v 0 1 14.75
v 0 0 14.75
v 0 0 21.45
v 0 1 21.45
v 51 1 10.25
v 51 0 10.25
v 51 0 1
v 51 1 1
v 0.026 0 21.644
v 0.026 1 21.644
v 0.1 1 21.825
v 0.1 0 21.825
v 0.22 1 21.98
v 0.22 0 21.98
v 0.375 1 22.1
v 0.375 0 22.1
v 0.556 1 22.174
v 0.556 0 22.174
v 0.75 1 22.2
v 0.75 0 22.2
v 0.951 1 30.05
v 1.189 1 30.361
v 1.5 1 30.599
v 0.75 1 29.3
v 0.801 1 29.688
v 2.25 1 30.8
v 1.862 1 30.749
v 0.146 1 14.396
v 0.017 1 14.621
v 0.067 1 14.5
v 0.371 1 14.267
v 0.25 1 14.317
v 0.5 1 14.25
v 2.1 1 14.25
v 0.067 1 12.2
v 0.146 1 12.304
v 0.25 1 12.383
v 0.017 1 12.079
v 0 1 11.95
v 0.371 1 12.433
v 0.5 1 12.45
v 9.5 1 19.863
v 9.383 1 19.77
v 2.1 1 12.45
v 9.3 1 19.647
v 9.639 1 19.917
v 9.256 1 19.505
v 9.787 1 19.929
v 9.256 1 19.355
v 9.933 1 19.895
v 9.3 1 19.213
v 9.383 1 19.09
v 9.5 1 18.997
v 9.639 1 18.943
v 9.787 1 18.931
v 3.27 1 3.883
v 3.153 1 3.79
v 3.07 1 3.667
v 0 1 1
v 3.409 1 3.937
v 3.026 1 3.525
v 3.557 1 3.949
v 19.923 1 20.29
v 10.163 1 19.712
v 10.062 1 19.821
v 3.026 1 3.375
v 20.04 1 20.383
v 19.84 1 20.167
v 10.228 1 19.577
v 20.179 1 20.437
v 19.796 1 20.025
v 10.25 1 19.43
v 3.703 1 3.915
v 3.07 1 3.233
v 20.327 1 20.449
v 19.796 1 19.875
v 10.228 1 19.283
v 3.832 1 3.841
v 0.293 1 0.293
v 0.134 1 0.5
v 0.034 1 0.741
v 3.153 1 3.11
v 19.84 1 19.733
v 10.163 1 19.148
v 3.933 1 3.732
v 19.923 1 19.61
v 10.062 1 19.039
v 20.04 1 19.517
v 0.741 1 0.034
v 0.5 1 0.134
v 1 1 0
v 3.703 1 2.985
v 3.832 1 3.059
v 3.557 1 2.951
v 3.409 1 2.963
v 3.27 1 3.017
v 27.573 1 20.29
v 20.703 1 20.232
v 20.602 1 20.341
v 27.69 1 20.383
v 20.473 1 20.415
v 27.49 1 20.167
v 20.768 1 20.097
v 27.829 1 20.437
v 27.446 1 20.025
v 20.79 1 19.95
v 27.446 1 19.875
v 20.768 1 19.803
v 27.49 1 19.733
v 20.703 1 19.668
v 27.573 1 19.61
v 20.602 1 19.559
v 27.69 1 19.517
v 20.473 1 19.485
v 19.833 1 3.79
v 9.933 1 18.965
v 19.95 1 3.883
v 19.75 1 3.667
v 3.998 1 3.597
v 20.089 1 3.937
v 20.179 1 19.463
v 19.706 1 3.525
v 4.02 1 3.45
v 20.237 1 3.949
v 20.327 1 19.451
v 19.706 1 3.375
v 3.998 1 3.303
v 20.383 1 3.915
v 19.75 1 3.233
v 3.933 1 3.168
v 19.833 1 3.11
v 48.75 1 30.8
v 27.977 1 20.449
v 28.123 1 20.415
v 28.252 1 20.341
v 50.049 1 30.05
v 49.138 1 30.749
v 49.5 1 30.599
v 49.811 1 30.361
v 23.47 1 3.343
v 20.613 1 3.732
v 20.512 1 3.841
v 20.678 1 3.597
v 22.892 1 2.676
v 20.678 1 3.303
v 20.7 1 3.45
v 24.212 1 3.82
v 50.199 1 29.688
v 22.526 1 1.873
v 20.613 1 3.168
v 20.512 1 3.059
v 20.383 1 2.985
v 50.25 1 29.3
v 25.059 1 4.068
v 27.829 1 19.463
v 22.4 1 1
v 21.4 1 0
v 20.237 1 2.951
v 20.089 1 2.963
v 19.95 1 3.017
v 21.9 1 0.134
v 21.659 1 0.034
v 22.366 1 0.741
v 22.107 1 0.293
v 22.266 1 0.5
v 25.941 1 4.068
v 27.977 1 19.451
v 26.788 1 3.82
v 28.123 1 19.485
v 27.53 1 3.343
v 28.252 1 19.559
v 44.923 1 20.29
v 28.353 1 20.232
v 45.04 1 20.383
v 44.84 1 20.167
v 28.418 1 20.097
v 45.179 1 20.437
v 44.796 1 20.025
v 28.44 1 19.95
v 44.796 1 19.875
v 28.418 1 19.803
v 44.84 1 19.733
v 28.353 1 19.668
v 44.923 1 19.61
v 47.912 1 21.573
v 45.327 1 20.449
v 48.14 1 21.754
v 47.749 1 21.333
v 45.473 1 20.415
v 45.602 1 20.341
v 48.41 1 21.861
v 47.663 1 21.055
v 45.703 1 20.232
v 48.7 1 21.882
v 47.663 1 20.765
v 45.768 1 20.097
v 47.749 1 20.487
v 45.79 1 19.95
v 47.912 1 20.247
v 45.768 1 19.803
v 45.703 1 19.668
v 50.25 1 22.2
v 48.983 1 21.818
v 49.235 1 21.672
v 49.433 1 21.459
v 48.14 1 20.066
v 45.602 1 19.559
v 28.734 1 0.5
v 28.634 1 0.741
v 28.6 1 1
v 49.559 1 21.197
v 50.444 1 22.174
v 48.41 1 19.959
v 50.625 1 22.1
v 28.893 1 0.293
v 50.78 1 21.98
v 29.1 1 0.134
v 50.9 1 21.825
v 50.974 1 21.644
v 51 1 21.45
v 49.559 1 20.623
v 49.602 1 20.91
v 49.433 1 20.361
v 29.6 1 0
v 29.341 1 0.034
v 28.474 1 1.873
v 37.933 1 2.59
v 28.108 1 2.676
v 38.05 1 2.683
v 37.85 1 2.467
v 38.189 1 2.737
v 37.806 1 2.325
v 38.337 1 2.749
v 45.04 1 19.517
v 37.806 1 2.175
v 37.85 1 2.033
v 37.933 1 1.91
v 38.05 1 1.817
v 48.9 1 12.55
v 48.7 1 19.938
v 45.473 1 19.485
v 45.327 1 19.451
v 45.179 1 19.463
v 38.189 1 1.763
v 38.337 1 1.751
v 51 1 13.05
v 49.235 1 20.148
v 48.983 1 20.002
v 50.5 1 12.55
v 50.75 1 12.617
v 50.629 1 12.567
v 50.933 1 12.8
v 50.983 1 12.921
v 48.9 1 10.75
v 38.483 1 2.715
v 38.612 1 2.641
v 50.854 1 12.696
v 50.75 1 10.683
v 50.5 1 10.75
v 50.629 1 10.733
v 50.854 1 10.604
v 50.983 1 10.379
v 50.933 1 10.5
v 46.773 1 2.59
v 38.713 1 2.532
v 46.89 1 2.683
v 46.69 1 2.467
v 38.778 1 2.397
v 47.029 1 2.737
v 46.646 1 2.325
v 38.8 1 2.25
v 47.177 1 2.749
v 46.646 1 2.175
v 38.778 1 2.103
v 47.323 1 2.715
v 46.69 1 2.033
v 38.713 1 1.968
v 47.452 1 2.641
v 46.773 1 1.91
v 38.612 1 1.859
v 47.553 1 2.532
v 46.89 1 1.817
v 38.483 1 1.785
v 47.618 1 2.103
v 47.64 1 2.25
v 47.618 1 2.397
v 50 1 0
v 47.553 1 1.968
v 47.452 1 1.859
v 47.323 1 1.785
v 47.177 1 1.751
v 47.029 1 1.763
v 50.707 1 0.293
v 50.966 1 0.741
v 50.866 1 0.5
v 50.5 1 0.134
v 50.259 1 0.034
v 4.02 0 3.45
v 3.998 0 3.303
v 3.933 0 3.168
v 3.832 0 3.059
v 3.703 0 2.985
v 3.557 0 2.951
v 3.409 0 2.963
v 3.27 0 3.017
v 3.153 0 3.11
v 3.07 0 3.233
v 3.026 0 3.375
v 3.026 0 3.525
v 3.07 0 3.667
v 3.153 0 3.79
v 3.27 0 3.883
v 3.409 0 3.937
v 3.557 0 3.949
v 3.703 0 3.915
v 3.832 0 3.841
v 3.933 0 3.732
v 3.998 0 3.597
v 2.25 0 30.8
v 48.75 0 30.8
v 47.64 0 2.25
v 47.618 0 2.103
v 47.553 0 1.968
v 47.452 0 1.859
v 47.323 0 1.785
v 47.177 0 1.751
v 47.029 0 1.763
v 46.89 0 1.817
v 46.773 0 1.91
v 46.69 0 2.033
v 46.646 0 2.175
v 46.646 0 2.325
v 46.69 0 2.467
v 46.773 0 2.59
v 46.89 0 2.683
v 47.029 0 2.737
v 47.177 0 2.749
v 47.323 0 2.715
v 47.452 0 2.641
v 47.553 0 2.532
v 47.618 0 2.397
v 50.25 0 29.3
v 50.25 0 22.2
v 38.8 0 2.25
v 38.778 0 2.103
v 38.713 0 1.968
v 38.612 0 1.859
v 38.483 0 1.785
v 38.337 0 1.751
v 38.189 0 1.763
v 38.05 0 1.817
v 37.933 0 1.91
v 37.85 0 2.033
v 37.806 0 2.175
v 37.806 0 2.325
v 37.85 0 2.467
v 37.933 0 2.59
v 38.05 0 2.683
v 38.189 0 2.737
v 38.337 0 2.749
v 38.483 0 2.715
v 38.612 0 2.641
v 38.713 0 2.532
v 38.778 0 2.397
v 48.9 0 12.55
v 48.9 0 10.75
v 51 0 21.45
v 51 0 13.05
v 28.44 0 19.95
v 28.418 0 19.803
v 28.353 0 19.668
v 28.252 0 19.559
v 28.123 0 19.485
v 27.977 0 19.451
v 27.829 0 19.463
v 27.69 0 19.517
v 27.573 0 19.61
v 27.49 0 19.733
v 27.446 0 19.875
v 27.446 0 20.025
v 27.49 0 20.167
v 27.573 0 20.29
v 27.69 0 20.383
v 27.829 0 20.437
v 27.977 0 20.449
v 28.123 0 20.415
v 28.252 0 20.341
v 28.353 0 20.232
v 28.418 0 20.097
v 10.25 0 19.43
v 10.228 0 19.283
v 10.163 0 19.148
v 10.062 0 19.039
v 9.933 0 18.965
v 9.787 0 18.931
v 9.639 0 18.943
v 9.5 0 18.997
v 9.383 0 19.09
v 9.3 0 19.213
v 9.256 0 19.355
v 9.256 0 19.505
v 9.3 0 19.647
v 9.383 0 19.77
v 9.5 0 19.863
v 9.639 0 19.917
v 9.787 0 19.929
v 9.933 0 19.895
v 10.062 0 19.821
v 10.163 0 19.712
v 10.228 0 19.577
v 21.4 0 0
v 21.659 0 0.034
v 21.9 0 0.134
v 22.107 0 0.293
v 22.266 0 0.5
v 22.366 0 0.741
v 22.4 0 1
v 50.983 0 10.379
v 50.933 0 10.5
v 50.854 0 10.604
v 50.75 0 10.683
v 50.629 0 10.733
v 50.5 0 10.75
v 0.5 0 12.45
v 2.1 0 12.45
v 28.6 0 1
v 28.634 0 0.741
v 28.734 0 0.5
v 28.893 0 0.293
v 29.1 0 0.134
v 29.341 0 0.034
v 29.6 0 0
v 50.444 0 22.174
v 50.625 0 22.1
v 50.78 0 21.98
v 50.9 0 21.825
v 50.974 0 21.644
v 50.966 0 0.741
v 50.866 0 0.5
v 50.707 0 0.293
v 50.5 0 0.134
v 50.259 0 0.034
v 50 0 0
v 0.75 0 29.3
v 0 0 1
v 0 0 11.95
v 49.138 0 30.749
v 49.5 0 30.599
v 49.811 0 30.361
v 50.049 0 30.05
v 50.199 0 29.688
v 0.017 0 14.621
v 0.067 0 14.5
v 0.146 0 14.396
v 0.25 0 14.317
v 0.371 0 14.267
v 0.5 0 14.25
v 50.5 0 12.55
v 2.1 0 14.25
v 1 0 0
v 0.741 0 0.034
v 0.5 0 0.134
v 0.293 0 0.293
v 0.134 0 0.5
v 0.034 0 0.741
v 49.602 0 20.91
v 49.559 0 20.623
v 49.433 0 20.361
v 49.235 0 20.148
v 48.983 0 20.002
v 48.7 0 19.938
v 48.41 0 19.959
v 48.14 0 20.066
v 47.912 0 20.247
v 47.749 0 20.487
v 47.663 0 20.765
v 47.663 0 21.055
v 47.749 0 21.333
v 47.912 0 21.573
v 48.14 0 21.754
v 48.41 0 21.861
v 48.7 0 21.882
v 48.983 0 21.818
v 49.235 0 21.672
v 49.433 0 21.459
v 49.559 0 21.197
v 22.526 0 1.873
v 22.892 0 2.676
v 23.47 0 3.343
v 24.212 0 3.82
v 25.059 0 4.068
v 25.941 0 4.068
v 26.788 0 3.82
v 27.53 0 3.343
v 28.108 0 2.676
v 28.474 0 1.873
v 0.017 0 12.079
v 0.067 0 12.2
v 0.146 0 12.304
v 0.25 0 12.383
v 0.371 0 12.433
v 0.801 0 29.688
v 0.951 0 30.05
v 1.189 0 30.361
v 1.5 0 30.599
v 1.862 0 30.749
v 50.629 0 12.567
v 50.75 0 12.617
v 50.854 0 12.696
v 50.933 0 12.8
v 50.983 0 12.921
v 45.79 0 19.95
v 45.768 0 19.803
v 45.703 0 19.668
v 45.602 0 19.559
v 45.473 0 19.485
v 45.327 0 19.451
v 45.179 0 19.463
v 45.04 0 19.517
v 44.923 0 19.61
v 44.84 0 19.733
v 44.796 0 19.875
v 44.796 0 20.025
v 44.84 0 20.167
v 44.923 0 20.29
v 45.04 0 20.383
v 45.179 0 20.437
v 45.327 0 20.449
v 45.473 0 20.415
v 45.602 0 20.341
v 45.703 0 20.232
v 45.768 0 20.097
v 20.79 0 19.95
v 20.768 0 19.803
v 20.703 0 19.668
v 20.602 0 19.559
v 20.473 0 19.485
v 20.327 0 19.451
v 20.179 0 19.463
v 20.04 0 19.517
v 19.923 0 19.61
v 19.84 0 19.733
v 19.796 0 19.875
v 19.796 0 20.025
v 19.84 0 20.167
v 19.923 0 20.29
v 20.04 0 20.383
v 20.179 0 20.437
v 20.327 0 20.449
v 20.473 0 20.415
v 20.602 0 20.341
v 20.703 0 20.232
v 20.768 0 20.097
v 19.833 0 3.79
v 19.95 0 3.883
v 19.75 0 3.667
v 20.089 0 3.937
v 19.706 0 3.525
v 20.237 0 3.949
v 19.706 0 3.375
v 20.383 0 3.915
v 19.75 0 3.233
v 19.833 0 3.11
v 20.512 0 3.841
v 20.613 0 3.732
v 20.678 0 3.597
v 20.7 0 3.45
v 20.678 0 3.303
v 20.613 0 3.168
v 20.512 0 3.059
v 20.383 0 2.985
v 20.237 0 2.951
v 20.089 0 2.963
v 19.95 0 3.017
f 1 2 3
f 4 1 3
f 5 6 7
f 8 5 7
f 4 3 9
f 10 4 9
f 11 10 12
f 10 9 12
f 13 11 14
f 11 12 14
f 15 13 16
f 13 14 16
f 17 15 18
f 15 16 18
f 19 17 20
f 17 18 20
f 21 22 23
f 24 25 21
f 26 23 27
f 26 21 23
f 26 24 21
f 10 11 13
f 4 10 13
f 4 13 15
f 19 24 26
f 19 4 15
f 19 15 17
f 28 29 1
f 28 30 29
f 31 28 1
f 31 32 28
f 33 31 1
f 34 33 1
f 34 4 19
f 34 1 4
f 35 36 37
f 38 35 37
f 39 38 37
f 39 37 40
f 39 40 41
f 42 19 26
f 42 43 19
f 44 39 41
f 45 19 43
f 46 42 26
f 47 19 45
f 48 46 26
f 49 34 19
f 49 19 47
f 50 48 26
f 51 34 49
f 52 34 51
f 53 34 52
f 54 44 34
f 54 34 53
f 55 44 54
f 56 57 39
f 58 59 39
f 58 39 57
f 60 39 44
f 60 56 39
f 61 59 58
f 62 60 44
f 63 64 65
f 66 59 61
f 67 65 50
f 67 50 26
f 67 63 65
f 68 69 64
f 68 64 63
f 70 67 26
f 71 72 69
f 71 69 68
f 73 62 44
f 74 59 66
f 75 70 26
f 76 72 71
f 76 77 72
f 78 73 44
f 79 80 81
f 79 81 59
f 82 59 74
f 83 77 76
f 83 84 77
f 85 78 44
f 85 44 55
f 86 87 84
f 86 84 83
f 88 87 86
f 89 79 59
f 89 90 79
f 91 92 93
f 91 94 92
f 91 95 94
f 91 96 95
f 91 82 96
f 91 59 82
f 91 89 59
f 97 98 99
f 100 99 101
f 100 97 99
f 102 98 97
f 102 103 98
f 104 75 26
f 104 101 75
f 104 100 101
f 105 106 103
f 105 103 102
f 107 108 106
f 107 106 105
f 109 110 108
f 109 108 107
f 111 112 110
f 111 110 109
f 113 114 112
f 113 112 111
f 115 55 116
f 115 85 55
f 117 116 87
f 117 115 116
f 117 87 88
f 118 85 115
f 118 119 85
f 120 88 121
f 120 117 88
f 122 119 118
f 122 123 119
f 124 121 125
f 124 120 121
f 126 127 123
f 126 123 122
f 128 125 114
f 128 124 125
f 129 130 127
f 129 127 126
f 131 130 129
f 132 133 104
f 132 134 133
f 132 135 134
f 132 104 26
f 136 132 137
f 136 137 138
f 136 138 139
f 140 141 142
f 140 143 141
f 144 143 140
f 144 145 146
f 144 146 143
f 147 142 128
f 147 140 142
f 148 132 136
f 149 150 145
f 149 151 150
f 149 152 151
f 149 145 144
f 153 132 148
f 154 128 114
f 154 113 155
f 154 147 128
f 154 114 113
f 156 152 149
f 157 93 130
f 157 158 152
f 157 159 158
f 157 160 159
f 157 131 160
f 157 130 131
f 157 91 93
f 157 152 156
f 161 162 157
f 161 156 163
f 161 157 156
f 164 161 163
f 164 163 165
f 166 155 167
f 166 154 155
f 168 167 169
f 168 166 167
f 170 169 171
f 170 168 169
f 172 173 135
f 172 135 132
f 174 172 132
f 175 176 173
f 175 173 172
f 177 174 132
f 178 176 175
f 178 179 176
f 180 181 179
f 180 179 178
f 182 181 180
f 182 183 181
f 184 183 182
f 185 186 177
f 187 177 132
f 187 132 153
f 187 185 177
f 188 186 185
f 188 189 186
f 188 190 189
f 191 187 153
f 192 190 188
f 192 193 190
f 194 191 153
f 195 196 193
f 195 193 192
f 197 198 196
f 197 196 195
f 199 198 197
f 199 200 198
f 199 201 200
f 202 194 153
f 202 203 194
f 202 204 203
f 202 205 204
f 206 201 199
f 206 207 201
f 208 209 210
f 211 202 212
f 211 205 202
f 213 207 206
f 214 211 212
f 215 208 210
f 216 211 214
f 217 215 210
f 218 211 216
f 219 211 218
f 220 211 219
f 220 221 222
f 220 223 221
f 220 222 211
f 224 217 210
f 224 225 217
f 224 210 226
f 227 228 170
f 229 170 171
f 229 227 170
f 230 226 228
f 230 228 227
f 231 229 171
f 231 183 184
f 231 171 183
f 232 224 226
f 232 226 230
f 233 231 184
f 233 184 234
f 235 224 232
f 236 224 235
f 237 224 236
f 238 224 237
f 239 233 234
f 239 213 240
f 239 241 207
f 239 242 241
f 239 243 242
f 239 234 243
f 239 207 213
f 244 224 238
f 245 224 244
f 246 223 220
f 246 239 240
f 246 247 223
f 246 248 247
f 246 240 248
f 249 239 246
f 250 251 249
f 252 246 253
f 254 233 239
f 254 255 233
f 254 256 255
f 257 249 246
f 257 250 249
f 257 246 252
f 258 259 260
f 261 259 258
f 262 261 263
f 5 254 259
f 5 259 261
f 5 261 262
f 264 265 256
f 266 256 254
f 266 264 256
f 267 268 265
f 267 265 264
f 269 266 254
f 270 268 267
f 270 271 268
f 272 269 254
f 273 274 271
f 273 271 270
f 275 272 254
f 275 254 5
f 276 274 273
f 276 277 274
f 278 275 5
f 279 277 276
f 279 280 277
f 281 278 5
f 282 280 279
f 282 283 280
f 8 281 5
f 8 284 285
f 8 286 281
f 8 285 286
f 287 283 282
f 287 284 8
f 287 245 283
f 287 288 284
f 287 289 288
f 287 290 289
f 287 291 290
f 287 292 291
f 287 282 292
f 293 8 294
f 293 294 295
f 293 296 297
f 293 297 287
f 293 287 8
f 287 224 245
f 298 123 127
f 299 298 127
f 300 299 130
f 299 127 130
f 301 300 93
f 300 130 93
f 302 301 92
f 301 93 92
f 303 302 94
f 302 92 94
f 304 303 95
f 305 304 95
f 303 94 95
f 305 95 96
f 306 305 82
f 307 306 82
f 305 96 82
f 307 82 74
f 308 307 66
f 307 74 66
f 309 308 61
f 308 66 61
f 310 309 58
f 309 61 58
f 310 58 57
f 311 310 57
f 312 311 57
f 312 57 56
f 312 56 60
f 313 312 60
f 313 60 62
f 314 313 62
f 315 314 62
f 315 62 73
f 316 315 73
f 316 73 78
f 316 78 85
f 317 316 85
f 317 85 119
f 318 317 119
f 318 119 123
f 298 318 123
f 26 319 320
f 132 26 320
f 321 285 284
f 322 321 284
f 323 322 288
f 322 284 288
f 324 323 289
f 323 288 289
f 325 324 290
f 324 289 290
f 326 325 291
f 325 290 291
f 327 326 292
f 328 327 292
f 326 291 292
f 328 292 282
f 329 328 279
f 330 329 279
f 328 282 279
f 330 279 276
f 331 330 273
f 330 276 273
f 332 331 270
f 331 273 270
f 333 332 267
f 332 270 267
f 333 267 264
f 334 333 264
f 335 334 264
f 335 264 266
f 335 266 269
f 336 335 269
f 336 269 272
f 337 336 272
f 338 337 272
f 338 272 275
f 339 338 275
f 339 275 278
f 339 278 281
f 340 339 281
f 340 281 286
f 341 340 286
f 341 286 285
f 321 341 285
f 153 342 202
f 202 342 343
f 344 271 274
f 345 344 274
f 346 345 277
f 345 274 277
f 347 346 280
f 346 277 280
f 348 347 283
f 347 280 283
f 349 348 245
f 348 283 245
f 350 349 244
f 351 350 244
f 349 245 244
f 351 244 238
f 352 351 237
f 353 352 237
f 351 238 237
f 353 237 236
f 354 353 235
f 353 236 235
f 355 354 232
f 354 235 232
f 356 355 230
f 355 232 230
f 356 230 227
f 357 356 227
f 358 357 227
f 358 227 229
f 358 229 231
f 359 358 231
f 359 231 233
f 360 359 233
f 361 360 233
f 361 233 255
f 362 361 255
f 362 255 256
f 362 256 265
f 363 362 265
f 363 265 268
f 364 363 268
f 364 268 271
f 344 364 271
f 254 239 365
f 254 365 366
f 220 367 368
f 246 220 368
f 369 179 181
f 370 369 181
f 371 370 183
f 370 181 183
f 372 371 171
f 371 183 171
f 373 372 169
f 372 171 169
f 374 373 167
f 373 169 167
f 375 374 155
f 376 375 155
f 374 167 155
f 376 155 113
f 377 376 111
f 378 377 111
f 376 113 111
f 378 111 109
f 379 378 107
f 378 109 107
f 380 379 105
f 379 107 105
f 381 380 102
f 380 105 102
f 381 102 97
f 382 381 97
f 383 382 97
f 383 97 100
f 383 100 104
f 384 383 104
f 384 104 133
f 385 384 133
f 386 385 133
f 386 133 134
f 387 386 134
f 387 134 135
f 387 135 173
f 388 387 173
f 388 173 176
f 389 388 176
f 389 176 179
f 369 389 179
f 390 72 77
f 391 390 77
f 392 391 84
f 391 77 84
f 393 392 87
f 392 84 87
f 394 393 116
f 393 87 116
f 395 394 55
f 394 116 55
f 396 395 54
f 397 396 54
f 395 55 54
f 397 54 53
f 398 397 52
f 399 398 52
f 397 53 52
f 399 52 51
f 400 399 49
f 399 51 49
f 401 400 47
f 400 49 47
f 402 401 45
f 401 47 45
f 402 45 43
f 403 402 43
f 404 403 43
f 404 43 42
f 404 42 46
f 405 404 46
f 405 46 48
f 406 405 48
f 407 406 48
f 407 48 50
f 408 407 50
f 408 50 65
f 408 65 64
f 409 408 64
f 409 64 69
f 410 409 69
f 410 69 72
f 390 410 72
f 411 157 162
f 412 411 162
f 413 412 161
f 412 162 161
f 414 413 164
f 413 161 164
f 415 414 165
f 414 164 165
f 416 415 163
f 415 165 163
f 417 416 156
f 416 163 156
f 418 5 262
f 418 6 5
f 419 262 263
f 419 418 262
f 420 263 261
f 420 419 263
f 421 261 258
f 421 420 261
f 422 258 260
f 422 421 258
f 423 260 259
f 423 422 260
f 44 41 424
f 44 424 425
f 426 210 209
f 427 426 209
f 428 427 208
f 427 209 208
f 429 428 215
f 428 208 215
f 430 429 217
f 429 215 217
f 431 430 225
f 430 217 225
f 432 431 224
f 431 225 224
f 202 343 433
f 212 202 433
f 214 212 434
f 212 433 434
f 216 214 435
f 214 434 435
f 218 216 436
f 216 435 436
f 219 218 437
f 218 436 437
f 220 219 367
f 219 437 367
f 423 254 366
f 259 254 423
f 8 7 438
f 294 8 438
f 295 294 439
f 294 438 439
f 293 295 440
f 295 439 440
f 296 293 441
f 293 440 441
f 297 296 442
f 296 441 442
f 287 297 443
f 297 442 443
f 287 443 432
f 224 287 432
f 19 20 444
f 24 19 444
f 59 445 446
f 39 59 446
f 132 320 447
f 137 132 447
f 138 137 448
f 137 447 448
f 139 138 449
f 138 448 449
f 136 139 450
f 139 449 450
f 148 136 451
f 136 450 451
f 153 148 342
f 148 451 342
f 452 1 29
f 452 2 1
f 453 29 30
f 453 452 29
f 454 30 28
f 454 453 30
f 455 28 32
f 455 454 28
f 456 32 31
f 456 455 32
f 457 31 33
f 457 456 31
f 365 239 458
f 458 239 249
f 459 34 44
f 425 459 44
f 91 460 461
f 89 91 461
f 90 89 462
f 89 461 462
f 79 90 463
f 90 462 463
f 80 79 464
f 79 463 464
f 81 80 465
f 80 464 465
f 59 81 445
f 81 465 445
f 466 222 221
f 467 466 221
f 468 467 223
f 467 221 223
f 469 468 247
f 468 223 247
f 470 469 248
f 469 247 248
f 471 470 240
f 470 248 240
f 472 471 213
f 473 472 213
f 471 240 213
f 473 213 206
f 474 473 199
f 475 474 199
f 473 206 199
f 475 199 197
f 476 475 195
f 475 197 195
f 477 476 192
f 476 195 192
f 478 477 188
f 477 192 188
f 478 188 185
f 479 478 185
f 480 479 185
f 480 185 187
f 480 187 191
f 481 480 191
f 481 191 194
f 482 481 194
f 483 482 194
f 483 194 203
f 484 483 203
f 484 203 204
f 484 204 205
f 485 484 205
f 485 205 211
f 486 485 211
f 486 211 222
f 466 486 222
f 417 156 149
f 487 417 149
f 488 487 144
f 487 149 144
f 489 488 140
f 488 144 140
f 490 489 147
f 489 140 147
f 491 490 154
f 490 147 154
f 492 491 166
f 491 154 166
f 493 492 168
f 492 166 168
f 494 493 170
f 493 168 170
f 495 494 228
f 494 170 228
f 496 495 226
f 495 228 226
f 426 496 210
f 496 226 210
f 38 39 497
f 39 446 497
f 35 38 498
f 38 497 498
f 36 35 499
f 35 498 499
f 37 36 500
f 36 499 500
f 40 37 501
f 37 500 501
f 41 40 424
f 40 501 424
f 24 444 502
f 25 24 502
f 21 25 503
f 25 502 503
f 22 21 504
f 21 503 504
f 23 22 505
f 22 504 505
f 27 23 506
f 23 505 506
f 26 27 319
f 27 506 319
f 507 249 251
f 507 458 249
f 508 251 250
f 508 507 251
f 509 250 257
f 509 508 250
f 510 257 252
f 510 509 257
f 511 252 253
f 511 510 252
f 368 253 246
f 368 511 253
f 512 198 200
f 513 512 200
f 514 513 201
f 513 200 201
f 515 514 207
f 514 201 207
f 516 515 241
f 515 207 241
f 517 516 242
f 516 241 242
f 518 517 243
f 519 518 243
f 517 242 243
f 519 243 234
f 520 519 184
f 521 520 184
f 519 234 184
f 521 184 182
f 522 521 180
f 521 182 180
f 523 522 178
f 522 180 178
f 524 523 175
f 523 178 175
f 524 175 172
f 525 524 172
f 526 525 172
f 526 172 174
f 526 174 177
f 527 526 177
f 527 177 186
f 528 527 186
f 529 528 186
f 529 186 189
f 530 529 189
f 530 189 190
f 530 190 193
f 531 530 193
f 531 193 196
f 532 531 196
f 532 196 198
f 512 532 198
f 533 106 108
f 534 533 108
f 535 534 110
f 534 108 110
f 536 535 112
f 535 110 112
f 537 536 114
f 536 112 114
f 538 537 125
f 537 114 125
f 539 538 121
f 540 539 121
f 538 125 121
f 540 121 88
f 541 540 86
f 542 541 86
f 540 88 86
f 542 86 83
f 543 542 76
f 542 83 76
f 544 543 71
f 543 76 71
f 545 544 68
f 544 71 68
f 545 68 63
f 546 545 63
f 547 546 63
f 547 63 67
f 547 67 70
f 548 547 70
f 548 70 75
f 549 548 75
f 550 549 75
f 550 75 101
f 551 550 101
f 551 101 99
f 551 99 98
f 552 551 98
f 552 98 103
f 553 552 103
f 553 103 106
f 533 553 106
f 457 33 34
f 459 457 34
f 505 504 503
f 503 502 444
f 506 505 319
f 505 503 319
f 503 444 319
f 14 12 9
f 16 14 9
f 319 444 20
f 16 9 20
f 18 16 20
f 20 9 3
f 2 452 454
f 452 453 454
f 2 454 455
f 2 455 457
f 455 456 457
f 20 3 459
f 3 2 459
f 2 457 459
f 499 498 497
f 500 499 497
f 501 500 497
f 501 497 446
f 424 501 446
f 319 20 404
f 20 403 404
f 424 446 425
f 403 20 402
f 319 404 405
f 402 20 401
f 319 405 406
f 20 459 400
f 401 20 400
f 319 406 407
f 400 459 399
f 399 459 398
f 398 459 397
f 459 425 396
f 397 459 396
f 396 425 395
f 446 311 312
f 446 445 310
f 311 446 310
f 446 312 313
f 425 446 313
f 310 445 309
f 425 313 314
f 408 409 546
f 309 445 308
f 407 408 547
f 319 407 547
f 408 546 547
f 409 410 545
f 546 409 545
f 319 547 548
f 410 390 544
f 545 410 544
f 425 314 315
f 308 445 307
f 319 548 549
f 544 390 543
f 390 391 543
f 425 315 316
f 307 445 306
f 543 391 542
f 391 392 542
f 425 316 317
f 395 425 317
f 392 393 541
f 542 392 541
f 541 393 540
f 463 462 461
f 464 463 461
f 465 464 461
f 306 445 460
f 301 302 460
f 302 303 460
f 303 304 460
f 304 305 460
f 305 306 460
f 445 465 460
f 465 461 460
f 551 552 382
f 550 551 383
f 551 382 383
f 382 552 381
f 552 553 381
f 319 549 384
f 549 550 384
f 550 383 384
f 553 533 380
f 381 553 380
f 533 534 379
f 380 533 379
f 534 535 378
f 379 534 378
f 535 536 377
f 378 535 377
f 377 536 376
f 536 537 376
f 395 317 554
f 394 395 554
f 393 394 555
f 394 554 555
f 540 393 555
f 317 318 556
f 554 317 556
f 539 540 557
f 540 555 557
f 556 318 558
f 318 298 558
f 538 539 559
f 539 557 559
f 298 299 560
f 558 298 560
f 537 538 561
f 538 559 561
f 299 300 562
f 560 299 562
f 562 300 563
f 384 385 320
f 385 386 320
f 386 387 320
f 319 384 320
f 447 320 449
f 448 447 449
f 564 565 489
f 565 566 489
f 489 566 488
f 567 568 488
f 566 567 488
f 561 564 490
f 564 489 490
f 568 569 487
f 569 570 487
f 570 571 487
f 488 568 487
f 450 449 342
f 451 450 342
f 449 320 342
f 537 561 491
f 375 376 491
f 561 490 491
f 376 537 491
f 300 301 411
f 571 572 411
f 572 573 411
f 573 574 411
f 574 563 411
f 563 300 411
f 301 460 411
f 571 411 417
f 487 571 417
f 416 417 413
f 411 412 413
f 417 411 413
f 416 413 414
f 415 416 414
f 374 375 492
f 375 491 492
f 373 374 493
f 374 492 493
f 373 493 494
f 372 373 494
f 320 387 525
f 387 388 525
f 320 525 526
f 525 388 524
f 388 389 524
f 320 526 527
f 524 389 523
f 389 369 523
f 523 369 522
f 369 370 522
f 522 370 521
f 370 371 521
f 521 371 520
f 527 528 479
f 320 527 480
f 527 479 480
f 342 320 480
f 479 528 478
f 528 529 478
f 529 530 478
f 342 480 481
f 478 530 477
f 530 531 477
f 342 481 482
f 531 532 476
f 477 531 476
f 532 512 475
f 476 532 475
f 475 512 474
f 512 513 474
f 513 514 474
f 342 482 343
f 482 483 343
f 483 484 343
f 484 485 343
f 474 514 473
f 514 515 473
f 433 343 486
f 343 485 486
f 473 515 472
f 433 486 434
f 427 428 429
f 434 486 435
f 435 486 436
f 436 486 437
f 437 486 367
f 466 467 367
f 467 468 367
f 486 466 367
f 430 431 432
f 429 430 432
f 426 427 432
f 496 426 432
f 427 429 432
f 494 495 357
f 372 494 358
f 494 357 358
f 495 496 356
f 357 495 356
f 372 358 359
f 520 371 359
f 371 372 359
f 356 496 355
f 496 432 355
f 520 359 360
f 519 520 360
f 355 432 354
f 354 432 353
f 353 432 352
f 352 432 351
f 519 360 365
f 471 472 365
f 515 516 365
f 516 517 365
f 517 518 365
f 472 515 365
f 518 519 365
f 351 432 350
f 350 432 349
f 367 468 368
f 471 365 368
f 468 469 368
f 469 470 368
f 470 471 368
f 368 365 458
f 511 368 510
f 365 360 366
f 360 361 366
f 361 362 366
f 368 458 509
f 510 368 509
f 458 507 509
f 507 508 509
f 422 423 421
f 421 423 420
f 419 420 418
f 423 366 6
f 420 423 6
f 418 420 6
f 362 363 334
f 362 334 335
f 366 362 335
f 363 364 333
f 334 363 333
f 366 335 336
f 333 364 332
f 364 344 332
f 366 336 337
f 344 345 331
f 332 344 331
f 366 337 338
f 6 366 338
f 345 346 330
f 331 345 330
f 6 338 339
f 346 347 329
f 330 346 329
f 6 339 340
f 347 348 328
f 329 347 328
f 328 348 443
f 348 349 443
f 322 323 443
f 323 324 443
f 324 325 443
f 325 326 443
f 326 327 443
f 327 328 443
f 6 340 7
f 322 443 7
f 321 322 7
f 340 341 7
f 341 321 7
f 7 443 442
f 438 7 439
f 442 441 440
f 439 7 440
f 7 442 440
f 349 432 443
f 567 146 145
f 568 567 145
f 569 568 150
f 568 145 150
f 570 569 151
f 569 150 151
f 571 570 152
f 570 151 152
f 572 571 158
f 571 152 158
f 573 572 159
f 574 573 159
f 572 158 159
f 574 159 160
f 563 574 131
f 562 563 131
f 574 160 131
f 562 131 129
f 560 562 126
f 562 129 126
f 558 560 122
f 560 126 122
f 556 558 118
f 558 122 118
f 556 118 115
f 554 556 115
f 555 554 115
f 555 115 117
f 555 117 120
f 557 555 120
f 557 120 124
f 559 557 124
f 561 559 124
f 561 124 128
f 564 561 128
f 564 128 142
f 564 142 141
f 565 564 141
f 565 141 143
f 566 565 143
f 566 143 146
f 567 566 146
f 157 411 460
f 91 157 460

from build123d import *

# Parameters (mm, degrees)
BOSS_EXTRUDE1_DEPTH     = 1
SKETCH2_W               = 2.1
SKETCH2_H               = 1.8
CUT_EXTRUDE1_DEPTH      = 1
CUT_EXTRUDE1_DEPTH_BACK = 2
FILLET1_R               = 0.5
SKETCH3_R               = 0.5
SKETCH3_R_2             = 0.975
CUT_EXTRUDE2_DEPTH      = 1
CUT_EXTRUDE2_DEPTH_BACK = 2


with BuildPart() as part:
    # Sketch1 → Boss-Extrude1 (new body)
    with BuildSketch(Plane(origin=(0, 0, 0), x_dir=(1, 0, 0), z_dir=(0, 1, 0))):
        with BuildLine():
            Line((0, -1), (0, -21.45))
            ThreePointArc((0, -21.45), (0.219669914, -21.980330086), (0.75, -22.2))
            Line((0.75, -22.2), (0.75, -29.3))
            ThreePointArc((0.75, -29.3), (1.189339828, -30.360660172), (2.25, -30.8))
            Line((2.25, -30.8), (48.75, -30.8))
            ThreePointArc((48.75, -30.8), (49.810660172, -30.360660172), (50.25, -29.3))
            Line((50.25, -29.3), (50.25, -22.2))
            ThreePointArc((50.25, -22.2), (50.780330086, -21.980330086), (51, -21.45))
            Line((51, -21.45), (51, -1))
            ThreePointArc((51, -1), (50.707106781, -0.292893219), (50, 0))
            Line((50, 0), (1, 0))
            ThreePointArc((1, 0), (0.292893219, -0.292893219), (0, -1))
        make_face()
    extrude(amount=BOSS_EXTRUDE1_DEPTH)

    # Sketch2 → Cut-Extrude1 (cut, two sides)
    with BuildSketch(Plane(origin=(0, 1, 0), x_dir=(1, 0, 0), z_dir=(0, 1, 0))) as cut_extrude1_sk:
        with Locations((1.05, -13.35)):
            Rectangle(SKETCH2_W, SKETCH2_H)
        with BuildLine():
            Line((29.6, 0), (21.4, 0))
            ThreePointArc((21.4, 0), (22.107106781, -0.292893219), (22.4, -1))
            ThreePointArc((22.4, -1), (25.5, -4.1), (28.6, -1))
            ThreePointArc((28.6, -1), (28.892893219, -0.292893219), (29.6, 0))
        make_face()
        with Locations((49.95, -11.65)):
            Rectangle(SKETCH2_W, SKETCH2_H)
    extrude(amount=CUT_EXTRUDE1_DEPTH, mode=Mode.SUBTRACT)
    extrude(cut_extrude1_sk.sketch, amount=-CUT_EXTRUDE1_DEPTH_BACK, mode=Mode.SUBTRACT)

    # Fillet1
    fillet1_edges = [part.edges().sort_by_distance(p)[0] for p in [
        (0, 0.5, 14.25),
        (0, 0.5, 12.45),
        (51, 0.5, 10.75),
        (51, 0.5, 12.55),
    ]]
    fillet(fillet1_edges, radius=FILLET1_R)

    # Sketch3 → Cut-Extrude2 (cut, two sides)
    with BuildSketch(Plane(origin=(0, 1, 0), x_dir=(1, 0, 0), z_dir=(0, 1, 0))) as cut_extrude2_sk:
        with Locations((3.52, -3.45)):
            Circle(SKETCH3_R)
        with Locations((20.2, -3.45)):
            Circle(SKETCH3_R)
        with Locations((38.3, -2.25)):
            Circle(SKETCH3_R)
        with Locations((47.14, -2.25)):
            Circle(SKETCH3_R)
        with Locations((48.627, -20.91)):
            Circle(SKETCH3_R_2)
        with Locations((45.29, -19.95)):
            Circle(SKETCH3_R)
        with Locations((27.94, -19.95)):
            Circle(SKETCH3_R)
        with Locations((20.29, -19.95)):
            Circle(SKETCH3_R)
        with Locations((9.75, -19.43)):
            Circle(SKETCH3_R)
    extrude(amount=CUT_EXTRUDE2_DEPTH, mode=Mode.SUBTRACT)
    extrude(cut_extrude2_sk.sketch, amount=-CUT_EXTRUDE2_DEPTH_BACK, mode=Mode.SUBTRACT)


solid = part.part
